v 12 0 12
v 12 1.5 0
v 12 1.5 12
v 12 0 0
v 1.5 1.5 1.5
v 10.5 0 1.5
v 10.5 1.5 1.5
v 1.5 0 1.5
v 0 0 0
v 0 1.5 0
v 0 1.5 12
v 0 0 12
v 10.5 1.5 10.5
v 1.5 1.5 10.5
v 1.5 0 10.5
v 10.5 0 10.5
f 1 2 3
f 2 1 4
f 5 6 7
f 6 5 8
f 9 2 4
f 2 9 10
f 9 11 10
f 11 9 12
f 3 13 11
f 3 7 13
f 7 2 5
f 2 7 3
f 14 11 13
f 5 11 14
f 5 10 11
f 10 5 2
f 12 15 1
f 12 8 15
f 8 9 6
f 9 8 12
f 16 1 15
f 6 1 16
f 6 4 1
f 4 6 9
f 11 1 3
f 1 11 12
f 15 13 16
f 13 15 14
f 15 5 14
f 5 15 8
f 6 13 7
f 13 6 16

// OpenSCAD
// U-shaped spring clip.
$fn = 60;
eps = 0.02;
clip_w = 12;
clip_h = 12;
clip_t = 1.5;
union() { cube([clip_w,clip_t,clip_t]); translate([0,0,clip_h-clip_t]) cube([clip_w,clip_t,clip_t]); cube([clip_t,clip_t,clip_h]); translate([clip_w-clip_t,0,0]) cube([clip_t,clip_t,clip_h]); }
